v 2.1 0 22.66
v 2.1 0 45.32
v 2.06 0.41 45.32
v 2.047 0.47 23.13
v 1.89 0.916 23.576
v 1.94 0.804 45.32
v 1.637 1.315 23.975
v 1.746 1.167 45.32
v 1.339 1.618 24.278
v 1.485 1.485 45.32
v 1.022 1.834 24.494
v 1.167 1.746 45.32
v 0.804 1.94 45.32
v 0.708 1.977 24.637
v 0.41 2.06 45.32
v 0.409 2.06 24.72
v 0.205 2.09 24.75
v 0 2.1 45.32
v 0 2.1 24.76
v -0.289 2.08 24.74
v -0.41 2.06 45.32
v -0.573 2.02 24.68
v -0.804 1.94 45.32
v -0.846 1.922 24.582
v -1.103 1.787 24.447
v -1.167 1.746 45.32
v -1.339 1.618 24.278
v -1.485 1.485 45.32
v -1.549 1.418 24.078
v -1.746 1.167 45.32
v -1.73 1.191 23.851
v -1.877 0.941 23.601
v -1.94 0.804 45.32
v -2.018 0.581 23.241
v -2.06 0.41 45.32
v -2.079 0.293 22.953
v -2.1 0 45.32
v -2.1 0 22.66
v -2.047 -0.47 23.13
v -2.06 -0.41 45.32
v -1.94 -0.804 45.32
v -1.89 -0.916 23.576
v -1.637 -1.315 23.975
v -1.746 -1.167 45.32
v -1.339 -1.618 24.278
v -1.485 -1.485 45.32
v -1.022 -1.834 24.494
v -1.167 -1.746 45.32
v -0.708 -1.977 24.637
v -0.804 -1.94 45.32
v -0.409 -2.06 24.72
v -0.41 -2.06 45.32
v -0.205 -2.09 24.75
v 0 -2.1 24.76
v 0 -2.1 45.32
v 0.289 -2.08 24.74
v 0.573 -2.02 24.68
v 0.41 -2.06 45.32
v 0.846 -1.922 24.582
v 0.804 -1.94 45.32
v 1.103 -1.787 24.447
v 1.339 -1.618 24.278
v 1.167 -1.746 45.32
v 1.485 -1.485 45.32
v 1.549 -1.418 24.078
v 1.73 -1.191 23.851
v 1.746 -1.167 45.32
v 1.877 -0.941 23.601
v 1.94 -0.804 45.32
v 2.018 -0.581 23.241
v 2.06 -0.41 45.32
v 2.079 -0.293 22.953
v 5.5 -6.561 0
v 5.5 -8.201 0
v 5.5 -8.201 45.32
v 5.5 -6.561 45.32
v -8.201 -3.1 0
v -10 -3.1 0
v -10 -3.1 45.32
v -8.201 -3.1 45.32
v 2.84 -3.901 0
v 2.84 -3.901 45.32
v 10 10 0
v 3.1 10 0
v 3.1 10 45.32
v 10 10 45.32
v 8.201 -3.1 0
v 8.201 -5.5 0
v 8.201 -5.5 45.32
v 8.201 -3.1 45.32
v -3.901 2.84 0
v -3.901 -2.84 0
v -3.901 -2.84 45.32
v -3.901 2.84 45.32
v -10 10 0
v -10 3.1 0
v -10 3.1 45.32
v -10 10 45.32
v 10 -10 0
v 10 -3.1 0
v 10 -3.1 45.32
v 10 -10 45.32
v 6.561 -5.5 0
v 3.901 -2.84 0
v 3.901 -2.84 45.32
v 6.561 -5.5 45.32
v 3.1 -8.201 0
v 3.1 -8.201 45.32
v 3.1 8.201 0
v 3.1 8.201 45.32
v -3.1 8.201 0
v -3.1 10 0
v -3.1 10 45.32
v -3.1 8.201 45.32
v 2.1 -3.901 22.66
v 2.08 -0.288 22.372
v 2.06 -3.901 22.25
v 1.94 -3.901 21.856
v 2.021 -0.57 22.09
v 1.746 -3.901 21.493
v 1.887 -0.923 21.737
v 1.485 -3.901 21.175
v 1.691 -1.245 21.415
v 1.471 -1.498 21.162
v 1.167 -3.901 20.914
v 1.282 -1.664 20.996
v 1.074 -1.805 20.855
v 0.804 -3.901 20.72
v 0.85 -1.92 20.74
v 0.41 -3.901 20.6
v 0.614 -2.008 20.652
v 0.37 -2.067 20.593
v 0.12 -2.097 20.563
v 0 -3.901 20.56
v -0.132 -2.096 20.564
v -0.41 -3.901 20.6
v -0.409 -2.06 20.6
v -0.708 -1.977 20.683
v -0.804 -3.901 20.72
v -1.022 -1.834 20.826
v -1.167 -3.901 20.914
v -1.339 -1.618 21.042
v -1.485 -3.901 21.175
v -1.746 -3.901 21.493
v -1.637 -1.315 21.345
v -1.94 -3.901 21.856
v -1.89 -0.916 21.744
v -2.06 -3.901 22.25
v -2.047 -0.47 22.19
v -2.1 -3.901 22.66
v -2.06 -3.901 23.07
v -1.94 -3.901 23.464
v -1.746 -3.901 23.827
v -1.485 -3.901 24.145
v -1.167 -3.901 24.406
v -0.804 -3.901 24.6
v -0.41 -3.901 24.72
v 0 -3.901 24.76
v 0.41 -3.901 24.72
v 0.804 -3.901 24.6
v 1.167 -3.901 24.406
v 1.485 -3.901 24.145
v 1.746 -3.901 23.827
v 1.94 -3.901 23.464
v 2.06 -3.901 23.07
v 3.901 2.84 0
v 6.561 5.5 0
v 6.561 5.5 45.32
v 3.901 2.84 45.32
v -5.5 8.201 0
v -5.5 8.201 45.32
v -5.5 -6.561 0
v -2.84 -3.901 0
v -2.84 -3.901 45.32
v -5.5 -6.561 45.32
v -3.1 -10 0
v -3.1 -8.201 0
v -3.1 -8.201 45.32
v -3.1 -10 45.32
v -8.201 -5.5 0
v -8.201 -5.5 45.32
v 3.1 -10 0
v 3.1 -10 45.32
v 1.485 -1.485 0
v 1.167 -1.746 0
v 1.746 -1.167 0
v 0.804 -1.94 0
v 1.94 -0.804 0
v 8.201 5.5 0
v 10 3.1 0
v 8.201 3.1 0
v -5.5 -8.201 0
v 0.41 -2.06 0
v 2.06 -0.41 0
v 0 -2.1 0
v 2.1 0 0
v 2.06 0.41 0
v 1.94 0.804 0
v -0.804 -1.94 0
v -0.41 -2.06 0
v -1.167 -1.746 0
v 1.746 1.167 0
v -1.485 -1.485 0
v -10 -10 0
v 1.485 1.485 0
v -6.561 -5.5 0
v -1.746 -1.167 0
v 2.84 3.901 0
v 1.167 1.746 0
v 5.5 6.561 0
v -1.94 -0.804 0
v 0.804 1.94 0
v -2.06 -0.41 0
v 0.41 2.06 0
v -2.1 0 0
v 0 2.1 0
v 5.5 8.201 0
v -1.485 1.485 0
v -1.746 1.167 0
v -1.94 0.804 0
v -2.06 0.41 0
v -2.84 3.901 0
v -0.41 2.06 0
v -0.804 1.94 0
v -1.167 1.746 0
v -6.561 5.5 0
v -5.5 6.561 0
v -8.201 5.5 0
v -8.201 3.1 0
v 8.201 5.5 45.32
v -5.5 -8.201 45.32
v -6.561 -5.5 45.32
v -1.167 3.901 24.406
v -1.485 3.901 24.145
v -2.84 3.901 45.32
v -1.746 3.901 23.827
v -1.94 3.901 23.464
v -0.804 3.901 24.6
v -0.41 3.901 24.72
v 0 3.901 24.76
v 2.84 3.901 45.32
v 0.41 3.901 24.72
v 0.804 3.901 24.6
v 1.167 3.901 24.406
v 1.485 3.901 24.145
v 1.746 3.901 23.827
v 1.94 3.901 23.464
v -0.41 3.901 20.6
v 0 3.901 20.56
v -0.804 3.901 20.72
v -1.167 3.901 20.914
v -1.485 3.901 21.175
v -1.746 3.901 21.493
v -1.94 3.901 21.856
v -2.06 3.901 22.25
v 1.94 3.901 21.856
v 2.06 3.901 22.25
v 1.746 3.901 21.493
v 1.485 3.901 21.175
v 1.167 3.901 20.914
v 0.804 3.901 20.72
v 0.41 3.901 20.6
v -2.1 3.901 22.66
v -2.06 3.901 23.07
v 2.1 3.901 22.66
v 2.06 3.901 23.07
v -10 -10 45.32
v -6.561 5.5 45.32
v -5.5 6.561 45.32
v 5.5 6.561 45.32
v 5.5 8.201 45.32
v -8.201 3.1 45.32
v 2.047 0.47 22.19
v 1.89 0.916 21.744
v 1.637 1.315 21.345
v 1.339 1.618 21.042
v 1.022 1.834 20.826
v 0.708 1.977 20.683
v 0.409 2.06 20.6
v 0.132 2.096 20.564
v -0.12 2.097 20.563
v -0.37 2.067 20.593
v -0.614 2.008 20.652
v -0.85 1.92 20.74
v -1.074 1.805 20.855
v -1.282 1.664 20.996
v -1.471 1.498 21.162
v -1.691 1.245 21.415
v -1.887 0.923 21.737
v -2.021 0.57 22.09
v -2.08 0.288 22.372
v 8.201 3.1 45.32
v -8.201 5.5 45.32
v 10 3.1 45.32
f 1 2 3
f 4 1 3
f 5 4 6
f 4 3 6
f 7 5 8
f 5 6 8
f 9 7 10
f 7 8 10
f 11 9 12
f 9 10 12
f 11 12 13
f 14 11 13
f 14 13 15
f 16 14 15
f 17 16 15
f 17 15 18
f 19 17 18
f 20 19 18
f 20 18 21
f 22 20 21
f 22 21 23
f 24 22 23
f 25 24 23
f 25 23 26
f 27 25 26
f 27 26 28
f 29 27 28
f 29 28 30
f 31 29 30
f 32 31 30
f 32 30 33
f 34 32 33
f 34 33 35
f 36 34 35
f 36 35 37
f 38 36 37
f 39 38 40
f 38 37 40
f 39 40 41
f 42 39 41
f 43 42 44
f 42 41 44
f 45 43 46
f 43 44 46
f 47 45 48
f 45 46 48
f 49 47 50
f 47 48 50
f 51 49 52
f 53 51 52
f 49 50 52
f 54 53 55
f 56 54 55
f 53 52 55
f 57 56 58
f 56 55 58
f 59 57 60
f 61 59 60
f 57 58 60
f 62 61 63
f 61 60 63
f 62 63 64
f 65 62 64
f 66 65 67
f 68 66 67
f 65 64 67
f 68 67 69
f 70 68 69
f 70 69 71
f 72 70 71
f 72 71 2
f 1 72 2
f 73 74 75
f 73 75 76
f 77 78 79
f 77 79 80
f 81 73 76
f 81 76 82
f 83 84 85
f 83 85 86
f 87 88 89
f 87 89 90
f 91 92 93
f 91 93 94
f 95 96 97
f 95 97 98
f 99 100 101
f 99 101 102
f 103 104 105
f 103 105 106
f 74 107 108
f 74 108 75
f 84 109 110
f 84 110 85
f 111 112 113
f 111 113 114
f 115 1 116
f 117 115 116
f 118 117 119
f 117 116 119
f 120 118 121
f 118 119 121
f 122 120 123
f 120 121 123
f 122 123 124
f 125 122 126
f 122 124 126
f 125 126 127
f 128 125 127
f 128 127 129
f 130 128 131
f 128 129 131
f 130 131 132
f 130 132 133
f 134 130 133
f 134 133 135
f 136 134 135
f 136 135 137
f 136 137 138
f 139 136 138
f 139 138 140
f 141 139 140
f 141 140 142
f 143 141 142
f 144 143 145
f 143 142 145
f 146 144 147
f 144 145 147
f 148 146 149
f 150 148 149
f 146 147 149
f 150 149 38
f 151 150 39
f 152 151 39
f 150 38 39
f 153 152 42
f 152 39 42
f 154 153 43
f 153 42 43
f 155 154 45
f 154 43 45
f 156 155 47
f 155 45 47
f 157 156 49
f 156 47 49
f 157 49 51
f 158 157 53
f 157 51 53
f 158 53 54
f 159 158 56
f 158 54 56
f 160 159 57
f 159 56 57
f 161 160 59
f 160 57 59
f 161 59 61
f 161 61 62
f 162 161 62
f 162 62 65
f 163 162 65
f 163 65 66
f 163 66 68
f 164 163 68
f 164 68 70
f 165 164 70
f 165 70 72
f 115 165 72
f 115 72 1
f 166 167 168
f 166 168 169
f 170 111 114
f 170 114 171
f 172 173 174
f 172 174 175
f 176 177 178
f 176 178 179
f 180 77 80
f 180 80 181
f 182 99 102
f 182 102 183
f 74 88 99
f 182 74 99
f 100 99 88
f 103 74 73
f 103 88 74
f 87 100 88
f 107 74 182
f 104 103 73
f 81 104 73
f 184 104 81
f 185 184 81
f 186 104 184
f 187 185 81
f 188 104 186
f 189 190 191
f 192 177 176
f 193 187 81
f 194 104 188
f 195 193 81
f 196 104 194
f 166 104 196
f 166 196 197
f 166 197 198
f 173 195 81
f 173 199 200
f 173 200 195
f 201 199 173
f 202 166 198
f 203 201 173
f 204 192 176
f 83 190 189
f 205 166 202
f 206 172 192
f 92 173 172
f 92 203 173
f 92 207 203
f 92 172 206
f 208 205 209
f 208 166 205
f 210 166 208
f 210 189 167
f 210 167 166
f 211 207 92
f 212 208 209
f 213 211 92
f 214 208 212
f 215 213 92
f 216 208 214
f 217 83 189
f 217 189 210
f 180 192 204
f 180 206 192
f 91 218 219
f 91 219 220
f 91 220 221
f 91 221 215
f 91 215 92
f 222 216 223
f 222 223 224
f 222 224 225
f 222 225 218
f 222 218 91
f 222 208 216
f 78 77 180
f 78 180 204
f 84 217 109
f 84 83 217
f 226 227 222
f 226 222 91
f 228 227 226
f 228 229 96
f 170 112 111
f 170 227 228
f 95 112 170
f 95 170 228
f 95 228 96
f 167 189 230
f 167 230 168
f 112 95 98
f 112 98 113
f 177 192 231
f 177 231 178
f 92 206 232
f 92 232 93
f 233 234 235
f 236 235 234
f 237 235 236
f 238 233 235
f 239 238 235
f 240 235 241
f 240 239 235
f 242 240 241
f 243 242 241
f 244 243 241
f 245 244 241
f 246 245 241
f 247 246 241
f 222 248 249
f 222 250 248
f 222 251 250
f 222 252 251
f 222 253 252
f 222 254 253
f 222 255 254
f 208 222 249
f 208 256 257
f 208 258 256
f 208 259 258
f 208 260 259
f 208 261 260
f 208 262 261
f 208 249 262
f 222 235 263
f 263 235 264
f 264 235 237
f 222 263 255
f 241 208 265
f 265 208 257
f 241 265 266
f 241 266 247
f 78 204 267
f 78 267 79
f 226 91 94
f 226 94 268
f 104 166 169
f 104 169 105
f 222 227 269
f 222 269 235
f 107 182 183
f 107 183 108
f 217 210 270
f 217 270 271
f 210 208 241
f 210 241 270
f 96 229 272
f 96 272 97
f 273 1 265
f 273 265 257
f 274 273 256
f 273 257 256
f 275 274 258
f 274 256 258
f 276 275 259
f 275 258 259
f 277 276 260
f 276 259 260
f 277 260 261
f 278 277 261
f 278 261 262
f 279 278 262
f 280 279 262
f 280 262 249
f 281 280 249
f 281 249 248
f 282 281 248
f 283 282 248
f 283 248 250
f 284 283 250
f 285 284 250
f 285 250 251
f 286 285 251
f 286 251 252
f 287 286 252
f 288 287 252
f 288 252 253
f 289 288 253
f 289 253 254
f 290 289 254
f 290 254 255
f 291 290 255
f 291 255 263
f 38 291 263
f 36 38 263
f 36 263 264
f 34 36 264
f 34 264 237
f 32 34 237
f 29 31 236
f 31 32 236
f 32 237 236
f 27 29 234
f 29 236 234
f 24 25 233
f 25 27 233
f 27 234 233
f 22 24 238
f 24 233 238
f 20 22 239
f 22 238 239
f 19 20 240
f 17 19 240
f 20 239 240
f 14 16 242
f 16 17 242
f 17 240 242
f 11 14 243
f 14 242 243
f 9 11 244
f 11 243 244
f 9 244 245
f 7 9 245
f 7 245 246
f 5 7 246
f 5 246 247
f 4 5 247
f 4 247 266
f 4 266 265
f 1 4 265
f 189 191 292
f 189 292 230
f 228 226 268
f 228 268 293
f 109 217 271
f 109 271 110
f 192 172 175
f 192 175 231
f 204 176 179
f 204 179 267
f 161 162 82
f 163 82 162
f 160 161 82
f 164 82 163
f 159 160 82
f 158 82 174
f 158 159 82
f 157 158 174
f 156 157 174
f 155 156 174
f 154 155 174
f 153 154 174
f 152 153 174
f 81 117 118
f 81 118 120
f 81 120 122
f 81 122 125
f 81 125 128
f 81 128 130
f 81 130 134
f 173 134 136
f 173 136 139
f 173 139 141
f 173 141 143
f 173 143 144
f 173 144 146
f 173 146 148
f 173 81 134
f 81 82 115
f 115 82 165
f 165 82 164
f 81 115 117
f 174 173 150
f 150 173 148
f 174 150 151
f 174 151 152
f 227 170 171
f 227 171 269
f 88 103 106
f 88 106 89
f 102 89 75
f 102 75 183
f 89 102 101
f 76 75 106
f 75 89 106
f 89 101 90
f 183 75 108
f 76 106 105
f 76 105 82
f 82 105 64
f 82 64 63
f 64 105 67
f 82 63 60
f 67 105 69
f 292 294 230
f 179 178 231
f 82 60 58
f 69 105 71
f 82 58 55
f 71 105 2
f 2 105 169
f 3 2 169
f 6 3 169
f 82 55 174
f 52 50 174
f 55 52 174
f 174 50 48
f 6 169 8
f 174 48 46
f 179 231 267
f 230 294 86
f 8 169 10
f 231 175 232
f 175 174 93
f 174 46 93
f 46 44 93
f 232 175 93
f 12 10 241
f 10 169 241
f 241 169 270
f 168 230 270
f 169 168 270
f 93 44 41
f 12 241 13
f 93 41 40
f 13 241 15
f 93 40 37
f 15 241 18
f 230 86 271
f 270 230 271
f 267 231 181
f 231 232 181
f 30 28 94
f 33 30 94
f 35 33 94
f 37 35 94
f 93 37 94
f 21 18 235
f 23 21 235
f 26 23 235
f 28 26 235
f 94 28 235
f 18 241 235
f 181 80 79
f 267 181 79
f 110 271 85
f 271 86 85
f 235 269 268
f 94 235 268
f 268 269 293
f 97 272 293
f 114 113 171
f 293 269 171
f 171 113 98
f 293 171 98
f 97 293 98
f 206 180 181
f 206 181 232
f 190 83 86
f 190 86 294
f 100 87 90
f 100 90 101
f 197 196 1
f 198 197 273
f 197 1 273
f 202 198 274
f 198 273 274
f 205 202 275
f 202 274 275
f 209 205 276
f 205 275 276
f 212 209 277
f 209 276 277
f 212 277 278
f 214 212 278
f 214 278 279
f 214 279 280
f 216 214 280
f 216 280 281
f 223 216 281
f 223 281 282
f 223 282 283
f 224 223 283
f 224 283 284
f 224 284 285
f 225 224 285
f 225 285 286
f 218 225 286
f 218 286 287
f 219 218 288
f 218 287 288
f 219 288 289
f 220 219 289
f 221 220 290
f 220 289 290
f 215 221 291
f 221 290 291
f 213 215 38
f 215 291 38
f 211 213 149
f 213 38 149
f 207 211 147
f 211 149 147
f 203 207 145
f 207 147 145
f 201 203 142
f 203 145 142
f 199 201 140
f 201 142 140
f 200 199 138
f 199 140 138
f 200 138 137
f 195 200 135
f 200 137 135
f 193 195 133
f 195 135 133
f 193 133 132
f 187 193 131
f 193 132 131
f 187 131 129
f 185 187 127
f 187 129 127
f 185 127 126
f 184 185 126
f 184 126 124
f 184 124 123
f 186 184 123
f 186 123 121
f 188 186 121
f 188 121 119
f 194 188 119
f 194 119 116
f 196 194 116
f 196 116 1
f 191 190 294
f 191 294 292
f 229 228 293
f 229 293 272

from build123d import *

# Parameters (mm, degrees)
BOSS_EXTRUDE1_DEPTH = 45.32
SKETCH2_R           = 2.1
CUT_EXTRUDE1_DEPTH  = 46.32
SKETCH3_R           = 2.1
CUT_EXTRUDE2_DEPTH  = 14.900660172


with BuildPart() as part:
    # Sketch1 → Boss-Extrude1 (new body)
    with BuildSketch(Plane.XY):
        Polygon((-3.1, 10), (-3.1, 8.200660172), (-5.5, 8.200660172), (-5.5, 6.560660172), (-2.84, 3.900660172), (2.84, 3.900660172), (5.5, 6.560660172), (5.5, 8.200660172), (3.1, 8.200660172), (3.1, 10), (10, 10), (10, 3.1), (8.200660172, 3.1), (8.200660172, 5.5), (6.560660172, 5.5), (3.900660172, 2.84), (3.900660172, -2.84), (6.560660172, -5.5), (8.200660172, -5.5), (8.200660172, -3.1), (10, -3.1), (10, -10), (3.1, -10), (3.1, -8.200660172), (5.5, -8.200660172), (5.5, -6.560660172), (2.84, -3.900660172), (-2.84, -3.900660172), (-5.5, -6.560660172), (-5.5, -8.200660172), (-3.1, -8.200660172), (-3.1, -10), (-10, -10), (-10, -3.1), (-8.200660172, -3.1), (-8.200660172, -5.5), (-6.560660172, -5.5), (-3.900660172, -2.84), (-3.900660172, 2.84), (-6.560660172, 5.5), (-8.200660172, 5.5), (-8.200660172, 3.1), (-10, 3.1), (-10, 10), align=None)
    extrude(amount=BOSS_EXTRUDE1_DEPTH)

    # Sketch2 → Cut-Extrude1 (cut, through all)
    with BuildSketch(Plane.XY.offset(45.32)):
        Circle(SKETCH2_R)
    extrude(amount=-CUT_EXTRUDE1_DEPTH, mode=Mode.SUBTRACT)

    # Sketch3 → Cut-Extrude2 (cut, through all)
    with BuildSketch(Plane(origin=(0, 3.900660172, 0), x_dir=(1, 0, 0), z_dir=(0, 1, 0))):
        with Locations((0, -22.66)):
            Circle(SKETCH3_R)
    extrude(amount=-CUT_EXTRUDE2_DEPTH, mode=Mode.SUBTRACT)


solid = part.part
